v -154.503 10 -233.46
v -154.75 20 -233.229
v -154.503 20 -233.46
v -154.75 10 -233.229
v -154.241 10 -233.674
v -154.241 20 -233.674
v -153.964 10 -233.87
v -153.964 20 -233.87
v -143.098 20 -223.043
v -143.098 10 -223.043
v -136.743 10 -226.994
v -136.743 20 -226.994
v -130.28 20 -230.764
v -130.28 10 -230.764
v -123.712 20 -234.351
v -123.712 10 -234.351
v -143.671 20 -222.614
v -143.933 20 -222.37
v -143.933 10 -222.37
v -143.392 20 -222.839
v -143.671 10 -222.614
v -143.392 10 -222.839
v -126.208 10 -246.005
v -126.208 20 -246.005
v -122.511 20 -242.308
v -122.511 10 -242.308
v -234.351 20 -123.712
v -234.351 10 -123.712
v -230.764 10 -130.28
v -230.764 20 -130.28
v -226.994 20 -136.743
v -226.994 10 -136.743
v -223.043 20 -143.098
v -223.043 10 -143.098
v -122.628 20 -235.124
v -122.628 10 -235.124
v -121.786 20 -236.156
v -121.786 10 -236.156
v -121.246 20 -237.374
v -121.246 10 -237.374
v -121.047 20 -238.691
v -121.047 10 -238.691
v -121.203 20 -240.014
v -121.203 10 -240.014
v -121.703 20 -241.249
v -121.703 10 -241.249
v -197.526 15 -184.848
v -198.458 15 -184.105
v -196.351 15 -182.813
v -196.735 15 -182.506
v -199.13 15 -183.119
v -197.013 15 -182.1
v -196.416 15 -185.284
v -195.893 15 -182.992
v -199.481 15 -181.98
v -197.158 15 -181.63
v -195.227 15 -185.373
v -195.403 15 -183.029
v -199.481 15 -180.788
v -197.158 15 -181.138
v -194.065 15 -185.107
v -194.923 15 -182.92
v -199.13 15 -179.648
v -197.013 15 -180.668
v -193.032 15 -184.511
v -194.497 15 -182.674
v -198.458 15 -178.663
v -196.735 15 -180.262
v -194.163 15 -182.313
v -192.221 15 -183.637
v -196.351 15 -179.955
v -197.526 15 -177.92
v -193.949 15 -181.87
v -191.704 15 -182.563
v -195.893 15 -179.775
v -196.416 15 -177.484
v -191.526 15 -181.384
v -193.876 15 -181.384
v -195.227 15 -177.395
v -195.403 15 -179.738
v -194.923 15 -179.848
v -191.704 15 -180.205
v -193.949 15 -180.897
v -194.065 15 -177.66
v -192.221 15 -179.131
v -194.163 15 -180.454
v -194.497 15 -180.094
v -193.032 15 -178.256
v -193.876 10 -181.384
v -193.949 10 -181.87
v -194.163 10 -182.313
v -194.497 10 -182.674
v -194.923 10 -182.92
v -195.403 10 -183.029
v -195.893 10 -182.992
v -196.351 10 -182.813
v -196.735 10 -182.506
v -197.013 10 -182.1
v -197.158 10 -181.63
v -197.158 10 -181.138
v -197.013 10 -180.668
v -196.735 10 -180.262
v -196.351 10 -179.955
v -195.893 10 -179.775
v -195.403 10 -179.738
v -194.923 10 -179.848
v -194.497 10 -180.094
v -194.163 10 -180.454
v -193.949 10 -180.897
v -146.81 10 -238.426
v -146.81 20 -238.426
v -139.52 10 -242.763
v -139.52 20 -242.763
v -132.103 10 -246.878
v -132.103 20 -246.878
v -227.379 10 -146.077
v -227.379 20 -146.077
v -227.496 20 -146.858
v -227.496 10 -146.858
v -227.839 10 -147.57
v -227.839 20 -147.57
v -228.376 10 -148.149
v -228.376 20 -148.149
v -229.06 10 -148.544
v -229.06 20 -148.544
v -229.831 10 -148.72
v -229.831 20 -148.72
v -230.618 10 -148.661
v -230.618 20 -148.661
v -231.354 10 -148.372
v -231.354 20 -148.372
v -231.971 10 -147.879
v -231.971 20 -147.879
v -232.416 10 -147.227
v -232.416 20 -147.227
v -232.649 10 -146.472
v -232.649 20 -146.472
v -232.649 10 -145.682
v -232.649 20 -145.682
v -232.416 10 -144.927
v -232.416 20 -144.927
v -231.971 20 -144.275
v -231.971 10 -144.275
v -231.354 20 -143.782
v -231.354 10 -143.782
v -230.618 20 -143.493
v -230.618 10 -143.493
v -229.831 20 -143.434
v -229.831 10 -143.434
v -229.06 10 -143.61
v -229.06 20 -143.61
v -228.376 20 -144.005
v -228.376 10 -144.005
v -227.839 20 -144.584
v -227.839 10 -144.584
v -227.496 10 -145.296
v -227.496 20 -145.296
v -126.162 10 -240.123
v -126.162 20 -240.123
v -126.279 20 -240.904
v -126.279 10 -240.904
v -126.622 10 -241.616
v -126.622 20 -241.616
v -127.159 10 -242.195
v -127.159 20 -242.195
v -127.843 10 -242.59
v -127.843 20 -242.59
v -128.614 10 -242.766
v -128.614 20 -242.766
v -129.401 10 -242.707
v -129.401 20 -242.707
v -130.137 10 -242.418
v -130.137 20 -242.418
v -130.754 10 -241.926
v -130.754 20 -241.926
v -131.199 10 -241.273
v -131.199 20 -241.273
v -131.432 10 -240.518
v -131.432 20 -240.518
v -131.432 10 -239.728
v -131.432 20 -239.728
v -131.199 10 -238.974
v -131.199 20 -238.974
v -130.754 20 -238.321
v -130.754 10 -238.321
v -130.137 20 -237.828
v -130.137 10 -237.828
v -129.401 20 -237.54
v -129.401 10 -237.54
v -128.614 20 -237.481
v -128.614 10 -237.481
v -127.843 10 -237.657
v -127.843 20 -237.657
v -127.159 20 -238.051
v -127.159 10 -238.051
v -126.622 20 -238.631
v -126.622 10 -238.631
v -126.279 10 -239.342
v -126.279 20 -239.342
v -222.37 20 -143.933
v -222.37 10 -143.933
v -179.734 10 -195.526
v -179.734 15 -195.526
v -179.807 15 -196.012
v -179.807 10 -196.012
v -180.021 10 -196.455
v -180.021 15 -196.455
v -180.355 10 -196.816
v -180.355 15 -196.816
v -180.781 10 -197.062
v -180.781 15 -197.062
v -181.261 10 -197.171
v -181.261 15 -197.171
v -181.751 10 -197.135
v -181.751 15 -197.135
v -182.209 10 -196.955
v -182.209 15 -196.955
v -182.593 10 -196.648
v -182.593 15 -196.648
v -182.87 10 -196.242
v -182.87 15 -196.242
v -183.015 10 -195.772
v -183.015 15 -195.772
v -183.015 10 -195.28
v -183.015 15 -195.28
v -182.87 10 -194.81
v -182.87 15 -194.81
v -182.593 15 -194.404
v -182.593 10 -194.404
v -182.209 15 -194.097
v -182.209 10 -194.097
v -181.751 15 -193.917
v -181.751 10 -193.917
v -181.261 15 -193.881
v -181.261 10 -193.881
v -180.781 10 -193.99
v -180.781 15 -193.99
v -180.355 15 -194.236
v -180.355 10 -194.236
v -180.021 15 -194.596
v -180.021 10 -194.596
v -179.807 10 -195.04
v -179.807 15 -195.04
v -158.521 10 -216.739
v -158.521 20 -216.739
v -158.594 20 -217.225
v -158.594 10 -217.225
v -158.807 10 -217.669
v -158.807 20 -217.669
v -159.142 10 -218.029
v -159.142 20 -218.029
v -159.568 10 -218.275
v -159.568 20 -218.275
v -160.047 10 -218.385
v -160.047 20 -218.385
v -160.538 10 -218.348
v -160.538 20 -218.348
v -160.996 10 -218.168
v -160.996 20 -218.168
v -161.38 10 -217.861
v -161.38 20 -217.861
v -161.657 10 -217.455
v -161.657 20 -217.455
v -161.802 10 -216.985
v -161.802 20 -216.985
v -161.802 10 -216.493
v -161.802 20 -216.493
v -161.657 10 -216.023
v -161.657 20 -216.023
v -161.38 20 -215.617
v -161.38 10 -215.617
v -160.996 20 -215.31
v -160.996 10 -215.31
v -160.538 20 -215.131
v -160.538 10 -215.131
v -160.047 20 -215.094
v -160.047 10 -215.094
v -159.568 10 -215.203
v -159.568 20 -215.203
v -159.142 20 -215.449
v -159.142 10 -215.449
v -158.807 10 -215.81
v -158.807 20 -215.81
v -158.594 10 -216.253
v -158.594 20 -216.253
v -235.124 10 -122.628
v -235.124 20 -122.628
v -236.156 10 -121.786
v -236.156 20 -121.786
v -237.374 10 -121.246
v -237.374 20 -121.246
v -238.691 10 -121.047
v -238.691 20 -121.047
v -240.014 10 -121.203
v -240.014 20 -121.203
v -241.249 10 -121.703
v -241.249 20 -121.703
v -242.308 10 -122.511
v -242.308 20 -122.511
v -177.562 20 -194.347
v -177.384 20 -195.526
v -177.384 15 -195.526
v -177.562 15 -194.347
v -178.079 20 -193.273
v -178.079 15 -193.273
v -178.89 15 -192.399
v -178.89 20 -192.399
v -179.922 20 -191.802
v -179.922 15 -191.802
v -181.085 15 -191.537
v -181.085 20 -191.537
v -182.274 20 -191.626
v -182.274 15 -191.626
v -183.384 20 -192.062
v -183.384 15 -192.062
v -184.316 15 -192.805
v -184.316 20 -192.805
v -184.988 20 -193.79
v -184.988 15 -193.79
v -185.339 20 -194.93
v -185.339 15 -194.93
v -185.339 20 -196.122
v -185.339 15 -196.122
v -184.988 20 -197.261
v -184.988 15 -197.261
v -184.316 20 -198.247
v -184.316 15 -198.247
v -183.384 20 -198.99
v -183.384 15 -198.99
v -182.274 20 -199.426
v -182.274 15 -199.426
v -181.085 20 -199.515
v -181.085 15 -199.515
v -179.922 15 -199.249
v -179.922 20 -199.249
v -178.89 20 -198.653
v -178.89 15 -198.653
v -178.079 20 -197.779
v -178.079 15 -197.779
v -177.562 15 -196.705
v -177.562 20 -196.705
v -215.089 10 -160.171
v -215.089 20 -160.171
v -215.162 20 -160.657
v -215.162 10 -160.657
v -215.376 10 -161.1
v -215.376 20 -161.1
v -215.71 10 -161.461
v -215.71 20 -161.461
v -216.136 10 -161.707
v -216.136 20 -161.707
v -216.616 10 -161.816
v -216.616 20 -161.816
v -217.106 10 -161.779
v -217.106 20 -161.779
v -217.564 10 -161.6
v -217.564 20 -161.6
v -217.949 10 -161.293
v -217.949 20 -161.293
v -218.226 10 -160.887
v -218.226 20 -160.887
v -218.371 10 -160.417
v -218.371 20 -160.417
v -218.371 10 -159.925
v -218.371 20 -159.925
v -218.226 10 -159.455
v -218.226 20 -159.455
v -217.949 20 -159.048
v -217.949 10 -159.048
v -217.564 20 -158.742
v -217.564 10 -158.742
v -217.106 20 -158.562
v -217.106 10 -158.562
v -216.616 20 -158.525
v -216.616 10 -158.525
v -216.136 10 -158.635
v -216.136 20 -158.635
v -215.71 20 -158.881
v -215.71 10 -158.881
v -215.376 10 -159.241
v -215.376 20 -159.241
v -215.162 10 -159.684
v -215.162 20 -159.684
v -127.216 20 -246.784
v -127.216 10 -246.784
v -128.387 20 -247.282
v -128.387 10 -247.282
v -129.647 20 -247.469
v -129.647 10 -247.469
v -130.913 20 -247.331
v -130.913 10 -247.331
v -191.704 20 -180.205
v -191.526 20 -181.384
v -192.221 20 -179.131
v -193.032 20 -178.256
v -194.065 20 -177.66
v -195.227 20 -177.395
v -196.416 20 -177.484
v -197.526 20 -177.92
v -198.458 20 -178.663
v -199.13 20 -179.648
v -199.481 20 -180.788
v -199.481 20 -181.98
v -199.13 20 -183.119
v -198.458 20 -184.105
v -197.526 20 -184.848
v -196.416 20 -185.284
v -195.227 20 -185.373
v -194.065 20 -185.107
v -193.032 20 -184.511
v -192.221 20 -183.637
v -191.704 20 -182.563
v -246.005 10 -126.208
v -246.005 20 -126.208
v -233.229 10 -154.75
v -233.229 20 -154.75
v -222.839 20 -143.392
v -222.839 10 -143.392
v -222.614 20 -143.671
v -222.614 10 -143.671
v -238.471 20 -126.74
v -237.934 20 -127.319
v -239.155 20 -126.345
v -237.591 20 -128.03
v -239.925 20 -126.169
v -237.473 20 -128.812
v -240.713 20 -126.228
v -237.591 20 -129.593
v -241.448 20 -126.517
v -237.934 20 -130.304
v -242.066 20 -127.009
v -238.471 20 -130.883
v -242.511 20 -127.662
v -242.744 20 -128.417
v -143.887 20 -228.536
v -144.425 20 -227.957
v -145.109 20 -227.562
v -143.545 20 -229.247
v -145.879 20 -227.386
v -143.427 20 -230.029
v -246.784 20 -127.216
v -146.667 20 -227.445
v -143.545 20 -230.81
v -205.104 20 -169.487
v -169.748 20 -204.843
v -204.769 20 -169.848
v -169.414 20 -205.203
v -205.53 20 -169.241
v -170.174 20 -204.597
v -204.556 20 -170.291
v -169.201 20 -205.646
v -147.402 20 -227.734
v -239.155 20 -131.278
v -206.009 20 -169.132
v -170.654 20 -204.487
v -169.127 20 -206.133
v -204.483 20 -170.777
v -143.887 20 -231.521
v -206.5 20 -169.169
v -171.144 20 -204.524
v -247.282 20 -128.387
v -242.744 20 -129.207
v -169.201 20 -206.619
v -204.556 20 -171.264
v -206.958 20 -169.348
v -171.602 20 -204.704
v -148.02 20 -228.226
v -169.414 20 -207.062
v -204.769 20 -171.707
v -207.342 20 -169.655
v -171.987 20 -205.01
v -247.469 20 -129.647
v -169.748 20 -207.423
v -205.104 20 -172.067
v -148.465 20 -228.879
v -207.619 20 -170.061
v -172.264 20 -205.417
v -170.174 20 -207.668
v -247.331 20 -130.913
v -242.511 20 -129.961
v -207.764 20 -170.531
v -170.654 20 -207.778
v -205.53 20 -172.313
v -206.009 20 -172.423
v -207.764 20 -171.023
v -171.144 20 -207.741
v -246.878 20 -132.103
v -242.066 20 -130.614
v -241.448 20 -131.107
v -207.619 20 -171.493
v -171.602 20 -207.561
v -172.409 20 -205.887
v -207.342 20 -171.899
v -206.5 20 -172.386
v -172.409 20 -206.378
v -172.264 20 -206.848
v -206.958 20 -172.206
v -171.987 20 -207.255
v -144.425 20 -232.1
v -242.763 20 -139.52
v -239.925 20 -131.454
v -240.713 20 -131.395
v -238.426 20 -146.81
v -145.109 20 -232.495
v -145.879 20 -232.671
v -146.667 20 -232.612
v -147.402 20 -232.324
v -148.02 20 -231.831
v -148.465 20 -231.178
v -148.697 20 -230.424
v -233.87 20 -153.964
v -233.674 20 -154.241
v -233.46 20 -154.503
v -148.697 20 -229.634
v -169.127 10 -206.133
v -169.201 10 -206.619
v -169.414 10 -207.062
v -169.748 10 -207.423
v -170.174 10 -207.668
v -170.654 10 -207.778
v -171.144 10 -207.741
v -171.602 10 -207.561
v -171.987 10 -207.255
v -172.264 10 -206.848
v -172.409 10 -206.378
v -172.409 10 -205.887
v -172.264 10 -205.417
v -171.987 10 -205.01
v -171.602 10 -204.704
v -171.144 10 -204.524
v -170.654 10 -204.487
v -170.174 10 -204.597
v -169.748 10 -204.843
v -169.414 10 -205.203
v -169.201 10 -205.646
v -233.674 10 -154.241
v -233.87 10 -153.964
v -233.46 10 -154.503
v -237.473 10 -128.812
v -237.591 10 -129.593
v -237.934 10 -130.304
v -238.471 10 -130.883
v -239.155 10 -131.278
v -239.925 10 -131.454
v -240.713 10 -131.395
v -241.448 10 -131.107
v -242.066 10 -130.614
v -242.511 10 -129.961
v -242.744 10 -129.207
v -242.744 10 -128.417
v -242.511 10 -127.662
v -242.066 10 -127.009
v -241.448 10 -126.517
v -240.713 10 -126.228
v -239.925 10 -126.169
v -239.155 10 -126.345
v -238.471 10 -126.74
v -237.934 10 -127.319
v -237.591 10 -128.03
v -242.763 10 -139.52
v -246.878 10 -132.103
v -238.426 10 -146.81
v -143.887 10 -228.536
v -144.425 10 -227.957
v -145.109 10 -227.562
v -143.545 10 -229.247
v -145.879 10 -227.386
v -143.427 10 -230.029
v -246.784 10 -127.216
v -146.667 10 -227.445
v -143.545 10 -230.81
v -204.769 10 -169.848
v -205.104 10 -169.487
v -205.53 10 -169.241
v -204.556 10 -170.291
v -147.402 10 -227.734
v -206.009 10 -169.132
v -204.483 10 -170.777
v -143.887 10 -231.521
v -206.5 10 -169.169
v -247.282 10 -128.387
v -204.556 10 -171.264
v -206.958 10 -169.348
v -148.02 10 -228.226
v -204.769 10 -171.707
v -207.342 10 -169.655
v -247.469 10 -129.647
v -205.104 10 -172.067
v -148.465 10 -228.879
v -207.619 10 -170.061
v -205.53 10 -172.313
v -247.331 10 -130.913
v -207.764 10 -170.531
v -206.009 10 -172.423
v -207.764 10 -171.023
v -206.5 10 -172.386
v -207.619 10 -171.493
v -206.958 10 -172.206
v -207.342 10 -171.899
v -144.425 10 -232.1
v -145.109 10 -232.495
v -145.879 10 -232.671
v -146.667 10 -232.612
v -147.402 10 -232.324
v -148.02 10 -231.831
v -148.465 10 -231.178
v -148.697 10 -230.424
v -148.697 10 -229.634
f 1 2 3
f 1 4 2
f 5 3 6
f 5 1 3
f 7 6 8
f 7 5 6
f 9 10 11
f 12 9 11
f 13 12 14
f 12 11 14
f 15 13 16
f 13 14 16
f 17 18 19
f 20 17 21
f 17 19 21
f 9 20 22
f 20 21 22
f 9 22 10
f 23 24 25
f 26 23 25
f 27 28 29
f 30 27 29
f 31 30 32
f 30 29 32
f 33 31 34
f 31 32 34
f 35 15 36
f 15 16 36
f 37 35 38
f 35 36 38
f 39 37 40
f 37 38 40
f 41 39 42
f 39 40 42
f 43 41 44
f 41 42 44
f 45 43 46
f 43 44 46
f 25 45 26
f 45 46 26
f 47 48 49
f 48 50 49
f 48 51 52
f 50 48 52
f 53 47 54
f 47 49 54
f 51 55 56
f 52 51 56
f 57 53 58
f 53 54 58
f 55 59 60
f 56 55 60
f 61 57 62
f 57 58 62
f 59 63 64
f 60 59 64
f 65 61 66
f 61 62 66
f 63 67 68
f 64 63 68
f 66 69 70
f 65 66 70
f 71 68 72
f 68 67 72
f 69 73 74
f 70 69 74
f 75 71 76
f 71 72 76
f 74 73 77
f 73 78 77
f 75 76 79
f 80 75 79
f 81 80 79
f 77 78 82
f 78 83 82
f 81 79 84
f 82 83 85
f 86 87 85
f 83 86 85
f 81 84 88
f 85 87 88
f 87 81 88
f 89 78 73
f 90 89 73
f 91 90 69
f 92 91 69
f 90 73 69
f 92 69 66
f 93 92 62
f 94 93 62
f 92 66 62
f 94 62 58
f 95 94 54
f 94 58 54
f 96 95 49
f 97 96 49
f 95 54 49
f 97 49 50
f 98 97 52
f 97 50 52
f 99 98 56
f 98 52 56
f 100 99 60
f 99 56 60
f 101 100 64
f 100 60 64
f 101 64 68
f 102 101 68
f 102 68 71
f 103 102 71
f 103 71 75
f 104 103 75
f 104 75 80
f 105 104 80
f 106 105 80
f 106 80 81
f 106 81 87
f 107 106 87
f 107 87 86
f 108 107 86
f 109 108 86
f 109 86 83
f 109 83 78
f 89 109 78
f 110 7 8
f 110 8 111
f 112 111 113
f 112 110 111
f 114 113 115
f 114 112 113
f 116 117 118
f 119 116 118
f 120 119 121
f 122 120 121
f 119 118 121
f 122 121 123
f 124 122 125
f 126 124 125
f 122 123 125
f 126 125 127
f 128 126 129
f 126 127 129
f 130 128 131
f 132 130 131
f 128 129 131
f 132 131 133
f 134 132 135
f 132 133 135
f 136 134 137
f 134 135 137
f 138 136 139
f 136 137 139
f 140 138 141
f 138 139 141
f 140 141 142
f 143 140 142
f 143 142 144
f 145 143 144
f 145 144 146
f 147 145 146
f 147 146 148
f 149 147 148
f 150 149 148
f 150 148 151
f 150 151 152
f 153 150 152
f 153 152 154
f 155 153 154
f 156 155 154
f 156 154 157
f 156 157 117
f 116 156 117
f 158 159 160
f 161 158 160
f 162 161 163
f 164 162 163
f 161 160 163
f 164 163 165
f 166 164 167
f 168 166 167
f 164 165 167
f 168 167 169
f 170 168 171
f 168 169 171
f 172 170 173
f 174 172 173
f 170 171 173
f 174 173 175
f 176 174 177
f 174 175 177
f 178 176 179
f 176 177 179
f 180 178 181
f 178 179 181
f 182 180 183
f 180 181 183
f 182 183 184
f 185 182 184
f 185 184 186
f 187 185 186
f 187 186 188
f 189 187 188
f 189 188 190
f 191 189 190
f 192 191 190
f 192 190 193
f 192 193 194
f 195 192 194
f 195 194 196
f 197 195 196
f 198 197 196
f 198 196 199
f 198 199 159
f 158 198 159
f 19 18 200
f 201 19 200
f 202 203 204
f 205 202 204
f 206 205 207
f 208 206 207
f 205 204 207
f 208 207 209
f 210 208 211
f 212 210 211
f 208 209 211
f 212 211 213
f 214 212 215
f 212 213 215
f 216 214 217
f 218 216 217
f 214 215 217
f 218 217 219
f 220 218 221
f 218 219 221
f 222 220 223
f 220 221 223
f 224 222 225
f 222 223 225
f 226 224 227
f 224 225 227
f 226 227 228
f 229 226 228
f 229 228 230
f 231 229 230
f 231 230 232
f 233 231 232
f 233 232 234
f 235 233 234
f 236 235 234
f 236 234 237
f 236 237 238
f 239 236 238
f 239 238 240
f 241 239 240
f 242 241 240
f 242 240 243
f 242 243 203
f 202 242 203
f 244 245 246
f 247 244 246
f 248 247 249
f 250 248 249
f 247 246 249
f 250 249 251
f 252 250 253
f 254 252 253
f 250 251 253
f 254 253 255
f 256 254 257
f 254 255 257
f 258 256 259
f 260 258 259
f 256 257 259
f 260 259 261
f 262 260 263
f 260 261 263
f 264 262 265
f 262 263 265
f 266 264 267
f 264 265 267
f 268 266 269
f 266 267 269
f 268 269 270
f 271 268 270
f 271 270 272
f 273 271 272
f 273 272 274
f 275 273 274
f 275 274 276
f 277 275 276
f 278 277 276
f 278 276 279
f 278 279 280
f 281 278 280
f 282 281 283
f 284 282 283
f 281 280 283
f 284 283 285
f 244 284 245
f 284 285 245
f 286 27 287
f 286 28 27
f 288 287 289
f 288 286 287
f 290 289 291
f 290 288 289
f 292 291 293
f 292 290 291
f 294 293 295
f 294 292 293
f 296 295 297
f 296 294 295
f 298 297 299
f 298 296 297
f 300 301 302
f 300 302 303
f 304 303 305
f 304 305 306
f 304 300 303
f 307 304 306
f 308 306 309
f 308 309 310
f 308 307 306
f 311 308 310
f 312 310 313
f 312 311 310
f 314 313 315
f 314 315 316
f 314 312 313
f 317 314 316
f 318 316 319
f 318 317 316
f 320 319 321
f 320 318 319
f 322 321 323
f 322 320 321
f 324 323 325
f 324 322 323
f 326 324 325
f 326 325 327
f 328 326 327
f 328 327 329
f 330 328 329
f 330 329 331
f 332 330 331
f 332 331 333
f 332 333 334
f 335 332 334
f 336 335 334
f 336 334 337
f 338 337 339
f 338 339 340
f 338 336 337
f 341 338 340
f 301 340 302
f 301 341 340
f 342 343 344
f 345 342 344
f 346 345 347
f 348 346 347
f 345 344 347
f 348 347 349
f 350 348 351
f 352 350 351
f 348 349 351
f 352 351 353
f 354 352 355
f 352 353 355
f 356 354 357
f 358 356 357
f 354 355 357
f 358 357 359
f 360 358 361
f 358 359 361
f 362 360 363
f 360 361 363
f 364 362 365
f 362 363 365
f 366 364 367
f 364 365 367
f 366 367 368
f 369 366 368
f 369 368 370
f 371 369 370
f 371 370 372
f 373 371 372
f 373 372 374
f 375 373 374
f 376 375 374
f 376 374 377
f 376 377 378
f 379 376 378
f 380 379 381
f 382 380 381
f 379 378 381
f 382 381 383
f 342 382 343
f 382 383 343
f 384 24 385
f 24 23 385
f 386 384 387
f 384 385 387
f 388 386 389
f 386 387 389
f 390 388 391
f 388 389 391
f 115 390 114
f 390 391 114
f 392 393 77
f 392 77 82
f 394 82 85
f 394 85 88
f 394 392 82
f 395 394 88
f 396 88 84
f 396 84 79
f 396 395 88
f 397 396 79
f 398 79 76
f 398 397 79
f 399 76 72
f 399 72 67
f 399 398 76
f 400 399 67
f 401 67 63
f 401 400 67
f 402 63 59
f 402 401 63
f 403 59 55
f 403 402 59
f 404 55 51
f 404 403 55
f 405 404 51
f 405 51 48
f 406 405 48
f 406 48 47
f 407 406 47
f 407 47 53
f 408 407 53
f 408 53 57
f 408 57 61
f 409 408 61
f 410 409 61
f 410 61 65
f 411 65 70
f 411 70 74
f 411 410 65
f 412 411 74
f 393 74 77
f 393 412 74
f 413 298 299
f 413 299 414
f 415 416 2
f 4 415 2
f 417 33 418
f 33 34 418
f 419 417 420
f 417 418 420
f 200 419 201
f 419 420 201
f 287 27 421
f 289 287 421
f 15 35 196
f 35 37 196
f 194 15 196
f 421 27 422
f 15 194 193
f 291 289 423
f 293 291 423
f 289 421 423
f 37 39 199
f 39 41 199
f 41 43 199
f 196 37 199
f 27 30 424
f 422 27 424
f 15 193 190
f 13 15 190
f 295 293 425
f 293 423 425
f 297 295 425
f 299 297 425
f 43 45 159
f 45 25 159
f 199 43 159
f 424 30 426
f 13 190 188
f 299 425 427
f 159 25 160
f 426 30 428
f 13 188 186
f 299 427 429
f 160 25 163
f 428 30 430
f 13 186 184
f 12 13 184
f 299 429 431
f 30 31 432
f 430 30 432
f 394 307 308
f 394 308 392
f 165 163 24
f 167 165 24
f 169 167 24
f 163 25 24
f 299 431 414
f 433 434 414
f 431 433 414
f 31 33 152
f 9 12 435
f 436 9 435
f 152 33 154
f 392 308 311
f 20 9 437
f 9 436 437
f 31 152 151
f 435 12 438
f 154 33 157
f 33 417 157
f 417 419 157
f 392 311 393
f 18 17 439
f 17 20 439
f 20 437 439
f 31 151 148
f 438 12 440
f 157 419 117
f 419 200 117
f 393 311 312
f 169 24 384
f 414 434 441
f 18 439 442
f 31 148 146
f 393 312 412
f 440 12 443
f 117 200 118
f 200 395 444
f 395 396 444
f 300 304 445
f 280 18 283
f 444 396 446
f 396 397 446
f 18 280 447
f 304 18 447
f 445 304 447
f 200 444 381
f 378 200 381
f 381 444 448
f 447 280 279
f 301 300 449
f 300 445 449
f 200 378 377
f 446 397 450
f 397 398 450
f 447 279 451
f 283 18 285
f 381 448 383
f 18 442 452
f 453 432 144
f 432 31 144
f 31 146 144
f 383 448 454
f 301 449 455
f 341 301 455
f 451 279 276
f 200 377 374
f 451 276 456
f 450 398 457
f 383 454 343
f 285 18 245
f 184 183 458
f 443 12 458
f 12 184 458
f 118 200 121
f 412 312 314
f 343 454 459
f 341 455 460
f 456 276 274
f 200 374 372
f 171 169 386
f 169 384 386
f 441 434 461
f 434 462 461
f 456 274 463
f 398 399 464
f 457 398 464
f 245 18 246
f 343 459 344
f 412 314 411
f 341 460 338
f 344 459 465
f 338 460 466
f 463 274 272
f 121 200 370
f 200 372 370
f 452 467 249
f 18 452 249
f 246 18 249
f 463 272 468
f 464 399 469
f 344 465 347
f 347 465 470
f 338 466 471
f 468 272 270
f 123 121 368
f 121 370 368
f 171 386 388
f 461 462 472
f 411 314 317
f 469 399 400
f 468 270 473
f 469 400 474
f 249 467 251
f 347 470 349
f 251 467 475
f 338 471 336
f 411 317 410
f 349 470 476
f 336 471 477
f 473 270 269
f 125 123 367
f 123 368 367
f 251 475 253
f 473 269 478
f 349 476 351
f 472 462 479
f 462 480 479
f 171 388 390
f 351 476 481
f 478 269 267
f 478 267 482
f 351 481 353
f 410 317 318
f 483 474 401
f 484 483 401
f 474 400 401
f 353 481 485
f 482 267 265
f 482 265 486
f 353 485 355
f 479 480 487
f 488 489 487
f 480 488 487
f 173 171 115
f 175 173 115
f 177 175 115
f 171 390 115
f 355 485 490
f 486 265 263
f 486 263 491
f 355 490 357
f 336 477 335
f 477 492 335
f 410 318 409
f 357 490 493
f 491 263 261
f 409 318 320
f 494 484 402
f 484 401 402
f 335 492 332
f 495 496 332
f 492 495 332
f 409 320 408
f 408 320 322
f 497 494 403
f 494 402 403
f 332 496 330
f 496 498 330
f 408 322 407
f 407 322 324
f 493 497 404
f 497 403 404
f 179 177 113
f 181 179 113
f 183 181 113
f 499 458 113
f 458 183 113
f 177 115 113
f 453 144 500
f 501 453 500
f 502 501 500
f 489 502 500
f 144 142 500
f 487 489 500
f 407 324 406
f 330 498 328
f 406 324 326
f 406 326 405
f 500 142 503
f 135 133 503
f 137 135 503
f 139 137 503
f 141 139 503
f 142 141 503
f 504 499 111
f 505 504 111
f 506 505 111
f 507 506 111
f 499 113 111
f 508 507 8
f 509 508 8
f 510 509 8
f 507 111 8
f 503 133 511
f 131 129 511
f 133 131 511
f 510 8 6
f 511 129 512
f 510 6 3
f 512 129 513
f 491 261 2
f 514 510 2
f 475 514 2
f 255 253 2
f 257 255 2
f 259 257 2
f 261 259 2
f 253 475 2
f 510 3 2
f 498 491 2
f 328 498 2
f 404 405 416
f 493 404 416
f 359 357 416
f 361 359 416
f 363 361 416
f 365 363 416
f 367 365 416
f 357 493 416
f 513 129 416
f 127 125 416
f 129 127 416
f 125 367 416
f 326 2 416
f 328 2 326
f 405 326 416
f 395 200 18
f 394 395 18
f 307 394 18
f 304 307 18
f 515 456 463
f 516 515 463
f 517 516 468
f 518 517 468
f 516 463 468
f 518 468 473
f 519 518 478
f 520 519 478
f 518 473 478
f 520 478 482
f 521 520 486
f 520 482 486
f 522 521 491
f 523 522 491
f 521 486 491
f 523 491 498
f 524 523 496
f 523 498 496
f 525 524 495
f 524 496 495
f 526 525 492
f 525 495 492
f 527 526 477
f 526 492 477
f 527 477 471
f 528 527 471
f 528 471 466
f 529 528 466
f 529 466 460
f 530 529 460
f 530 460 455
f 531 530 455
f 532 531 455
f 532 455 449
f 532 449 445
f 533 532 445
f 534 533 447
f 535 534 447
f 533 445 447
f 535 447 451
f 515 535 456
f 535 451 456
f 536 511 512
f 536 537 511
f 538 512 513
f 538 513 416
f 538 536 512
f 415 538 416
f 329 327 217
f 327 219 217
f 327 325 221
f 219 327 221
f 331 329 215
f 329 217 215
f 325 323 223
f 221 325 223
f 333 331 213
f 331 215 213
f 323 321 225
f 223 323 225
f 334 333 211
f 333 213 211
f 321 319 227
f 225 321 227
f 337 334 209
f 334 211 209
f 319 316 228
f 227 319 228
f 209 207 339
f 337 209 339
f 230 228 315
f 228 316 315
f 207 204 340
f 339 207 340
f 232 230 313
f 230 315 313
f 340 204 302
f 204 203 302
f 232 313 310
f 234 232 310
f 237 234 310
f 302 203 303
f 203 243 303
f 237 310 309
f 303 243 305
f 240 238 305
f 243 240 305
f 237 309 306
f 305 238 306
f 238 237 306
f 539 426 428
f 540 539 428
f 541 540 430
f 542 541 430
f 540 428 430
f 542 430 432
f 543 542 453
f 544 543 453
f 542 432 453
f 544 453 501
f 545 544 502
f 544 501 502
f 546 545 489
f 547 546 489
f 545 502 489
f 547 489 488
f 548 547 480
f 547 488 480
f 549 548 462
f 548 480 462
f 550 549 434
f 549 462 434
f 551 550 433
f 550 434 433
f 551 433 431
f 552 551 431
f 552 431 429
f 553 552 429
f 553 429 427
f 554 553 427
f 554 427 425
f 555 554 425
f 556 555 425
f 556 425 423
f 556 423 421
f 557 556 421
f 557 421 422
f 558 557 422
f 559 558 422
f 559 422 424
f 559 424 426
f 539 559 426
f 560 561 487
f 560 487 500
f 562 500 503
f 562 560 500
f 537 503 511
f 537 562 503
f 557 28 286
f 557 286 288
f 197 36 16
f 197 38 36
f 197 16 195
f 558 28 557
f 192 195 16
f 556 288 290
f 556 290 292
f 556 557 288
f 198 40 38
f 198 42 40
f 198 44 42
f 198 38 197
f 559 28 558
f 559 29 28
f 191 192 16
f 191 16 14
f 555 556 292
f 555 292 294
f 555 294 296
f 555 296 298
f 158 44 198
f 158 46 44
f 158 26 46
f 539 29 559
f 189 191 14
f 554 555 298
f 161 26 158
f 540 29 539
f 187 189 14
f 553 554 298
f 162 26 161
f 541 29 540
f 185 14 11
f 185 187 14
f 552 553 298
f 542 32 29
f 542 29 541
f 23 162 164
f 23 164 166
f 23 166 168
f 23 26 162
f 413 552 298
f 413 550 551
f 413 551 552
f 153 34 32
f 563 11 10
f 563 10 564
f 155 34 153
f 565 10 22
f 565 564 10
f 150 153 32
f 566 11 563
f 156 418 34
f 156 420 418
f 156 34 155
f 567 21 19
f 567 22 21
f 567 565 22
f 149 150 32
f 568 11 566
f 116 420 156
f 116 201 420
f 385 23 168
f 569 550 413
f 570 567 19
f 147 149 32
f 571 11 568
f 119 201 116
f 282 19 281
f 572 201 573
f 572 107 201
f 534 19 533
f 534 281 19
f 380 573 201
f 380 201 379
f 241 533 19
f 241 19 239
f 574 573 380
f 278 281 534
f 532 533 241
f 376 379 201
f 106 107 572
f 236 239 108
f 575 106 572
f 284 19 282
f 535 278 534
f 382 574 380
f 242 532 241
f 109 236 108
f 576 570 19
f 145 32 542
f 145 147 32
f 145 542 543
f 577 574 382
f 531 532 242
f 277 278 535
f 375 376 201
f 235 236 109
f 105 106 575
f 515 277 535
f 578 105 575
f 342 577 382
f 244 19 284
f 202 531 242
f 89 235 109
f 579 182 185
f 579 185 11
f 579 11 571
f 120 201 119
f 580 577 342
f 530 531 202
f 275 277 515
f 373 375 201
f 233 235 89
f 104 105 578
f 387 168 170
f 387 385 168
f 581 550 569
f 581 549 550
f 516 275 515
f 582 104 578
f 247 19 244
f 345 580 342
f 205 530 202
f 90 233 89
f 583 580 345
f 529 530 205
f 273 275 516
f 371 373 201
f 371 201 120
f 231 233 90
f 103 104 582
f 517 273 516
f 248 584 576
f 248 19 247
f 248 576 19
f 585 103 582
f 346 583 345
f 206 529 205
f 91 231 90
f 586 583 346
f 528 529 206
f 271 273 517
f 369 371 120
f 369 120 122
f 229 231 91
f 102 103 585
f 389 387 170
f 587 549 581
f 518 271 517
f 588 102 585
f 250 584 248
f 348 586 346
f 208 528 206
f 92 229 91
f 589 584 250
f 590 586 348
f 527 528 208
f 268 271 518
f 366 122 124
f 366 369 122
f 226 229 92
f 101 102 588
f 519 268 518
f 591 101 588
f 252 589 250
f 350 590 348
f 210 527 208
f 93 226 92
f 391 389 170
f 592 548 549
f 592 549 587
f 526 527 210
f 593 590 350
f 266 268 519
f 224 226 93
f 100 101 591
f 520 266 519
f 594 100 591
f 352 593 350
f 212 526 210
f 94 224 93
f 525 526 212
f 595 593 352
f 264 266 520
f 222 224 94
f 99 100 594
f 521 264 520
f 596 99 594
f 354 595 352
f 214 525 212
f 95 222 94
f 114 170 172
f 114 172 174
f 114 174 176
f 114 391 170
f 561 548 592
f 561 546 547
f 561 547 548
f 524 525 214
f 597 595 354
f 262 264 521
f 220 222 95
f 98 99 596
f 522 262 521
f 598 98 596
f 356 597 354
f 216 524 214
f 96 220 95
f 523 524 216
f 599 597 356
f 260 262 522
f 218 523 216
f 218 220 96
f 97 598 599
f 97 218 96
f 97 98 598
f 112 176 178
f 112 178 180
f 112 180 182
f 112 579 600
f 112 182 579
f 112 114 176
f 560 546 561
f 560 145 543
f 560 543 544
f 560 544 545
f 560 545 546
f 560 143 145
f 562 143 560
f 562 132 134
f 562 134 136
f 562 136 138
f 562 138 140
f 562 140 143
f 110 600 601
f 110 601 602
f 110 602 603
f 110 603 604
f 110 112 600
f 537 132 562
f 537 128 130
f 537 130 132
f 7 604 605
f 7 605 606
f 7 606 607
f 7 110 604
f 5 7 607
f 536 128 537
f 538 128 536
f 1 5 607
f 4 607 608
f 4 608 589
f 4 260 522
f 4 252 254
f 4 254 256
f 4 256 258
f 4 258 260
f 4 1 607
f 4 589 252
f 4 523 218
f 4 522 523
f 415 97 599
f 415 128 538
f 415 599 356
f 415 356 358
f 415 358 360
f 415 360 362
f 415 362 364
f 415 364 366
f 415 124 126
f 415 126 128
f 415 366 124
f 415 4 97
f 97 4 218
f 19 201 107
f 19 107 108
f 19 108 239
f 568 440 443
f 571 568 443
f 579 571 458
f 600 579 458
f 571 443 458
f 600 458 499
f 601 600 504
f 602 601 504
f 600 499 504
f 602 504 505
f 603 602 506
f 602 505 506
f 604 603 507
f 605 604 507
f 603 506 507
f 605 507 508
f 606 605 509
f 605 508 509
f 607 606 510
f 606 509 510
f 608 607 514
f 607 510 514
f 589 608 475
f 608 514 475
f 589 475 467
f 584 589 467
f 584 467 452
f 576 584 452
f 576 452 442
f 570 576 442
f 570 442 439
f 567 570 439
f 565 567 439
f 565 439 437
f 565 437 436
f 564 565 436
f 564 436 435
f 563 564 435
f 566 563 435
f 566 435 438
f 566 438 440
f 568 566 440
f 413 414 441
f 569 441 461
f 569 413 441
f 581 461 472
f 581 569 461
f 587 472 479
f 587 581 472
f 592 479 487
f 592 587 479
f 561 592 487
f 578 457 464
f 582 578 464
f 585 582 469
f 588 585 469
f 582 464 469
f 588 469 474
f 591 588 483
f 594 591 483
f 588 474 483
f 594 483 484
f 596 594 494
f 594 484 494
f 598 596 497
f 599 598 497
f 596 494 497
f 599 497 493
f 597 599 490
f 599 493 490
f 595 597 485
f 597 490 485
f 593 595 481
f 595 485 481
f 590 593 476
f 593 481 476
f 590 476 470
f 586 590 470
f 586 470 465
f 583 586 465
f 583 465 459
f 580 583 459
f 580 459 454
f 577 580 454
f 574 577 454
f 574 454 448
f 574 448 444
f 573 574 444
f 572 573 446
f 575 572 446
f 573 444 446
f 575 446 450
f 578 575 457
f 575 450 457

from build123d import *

# Parameters (mm, degrees)
SKETCH_1_R               = 275
SKETCH_1_R_2             = 255
EXTRUDE_1_DEPTH          = 10
EXTRUDE_2_DEPTH          = 10
SKETCH_8_R               = 2.65
SKETCH_8_R_2             = 1.65
SKETCH_8_R_3             = 2.15
CUT_EXTRUDE_1_DEPTH      = 21
SKETCH_9_OUTSIDE_W       = 707.614
SKETCH_9_OUTSIDE_H       = 707.614
CUT_EXTRUDE_2_DEPTH      = 21
SKETCH_10_W              = 777.504065726
SKETCH_10_H              = 20
CUT_EXTRUDE_3_DEPTH      = 276
CUT_EXTRUDE_3_DEPTH_BACK = 276
EXTRUDE_3_DEPTH          = 10
CUT_EXTRUDE_4_DEPTH      = 10
SKETCH_13_R              = 1.65
CUT_EXTRUDE_5_DEPTH      = 10
CUT_EXTRUDE_START        = -10
SKETCH_14_R              = 4
CUT_EXTRUDE_6_DEPTH      = 5
FILLET_1_R               = 5


with BuildPart() as part:
    # 草图1 → 凸台-拉伸1 (new body)
    with BuildSketch(Plane(origin=(0, 0, 0), x_dir=(1, 0, 0), z_dir=(0, 1, 0))):
        Circle(SKETCH_1_R)
        Circle(SKETCH_1_R_2, mode=Mode.SUBTRACT)
    extrude(amount=EXTRUDE_1_DEPTH)

    # 草图10 → 切除-拉伸3 (cut, two sides)
    with BuildSketch(Plane.XY) as cut_extrude_3_sk:
        Rectangle(SKETCH_10_W, SKETCH_10_H)
    extrude(amount=CUT_EXTRUDE_3_DEPTH, mode=Mode.SUBTRACT)
    extrude(cut_extrude_3_sk.sketch, amount=-CUT_EXTRUDE_3_DEPTH_BACK, mode=Mode.SUBTRACT)


with BuildPart() as body_2:
    # 草图2 → 凸台-拉伸2 (new body)
    with BuildSketch(Plane(origin=(0, 10, 0), x_dir=(1, 0, 0), z_dir=(0, 1, 0))):
        with BuildLine():
            Line((-110.525139894, 257.262887824), (-25.423255477, 200))
            Line((-25.423255477, 200), (0, 200))
            Line((0, 200), (25.423255477, 200))
            Line((25.423255477, 200), (110.525139894, 257.262887824))
            ThreePointArc((110.525139894, 257.262887824), (197.989898732, 197.989898732), (257.262887824, 110.525139894))
            Line((257.262887824, 110.525139894), (200, 25.423255477))
            Line((200, 25.423255477), (200, 0))
            Line((200, 0), (200, -25.423255477))
            Line((200, -25.423255477), (257.262887824, -110.525139894))
            ThreePointArc((257.262887824, -110.525139894), (197.989898732, -197.989898732), (110.525139894, -257.262887824))
            Line((110.525139894, -257.262887824), (25.423255477, -200))
            Line((25.423255477, -200), (0, -200))
            Line((0, -200), (-25.423255477, -200))
            Line((-25.423255477, -200), (-110.525139894, -257.262887824))
            ThreePointArc((-110.525139894, -257.262887824), (-197.989898732, -197.989898732), (-257.262887824, -110.525139894))
            Line((-257.262887824, -110.525139894), (-200, -25.423255477))
            Line((-200, -25.423255477), (-200, 25.423255477))
            Line((-200, 25.423255477), (-257.262887824, 110.525139894))
            ThreePointArc((-257.262887824, 110.525139894), (-197.989898732, 197.989898732), (-110.525139894, 257.262887824))
        make_face()
        with BuildLine():
            Line((0, 185), (30, 185))
            Line((30, 185), (111.993839361, 240.171563565))
            ThreePointArc((111.993839361, 240.171563565), (187.383297014, 187.383297014), (240.171563565, 111.993839361))
            Line((240.171563565, 111.993839361), (185, 30))
            Line((185, 30), (185, 0))
            Line((185, 0), (185, -30))
            Line((185, -30), (240.171563565, -111.993839361))
            ThreePointArc((240.171563565, -111.993839361), (187.383297014, -187.383297014), (111.993839361, -240.171563565))
            Line((111.993839361, -240.171563565), (30, -185))
            Line((30, -185), (0, -185))
            Line((0, -185), (-30, -185))
            Line((-30, -185), (-111.993839361, -240.171563565))
            ThreePointArc((-111.993839361, -240.171563565), (-187.383297014, -187.383297014), (-240.171563565, -111.993839361))
            Line((-240.171563565, -111.993839361), (-185, -30))
            Line((-185, -30), (-185, 30))
            Line((-185, 30), (-240.171563565, 111.993839361))
            ThreePointArc((-240.171563565, 111.993839361), (-187.383297014, 187.383297014), (-111.993839361, 240.171563565))
            Line((-111.993839361, 240.171563565), (-30, 185))
            Line((-30, 185), (0, 185))
        make_face(mode=Mode.SUBTRACT)
    extrude(amount=EXTRUDE_2_DEPTH)

    # 草图8 → 切除-拉伸1 (cut, through all)
    with BuildSketch(Plane(origin=(0, 20, 0), x_dir=(1, 0, 0), z_dir=(0, 1, 0))):
        with Locations((-10, 192.5)):
            Circle(SKETCH_8_R)
        with Locations((10, 192.5)):
            Circle(SKETCH_8_R)
        with Locations((-10, -192.5)):
            Circle(SKETCH_8_R)
        with Locations((10, -192.5)):
            Circle(SKETCH_8_R)
        with Locations((192.5, 10)):
            Circle(SKETCH_8_R)
        with Locations((192.5, -10)):
            Circle(SKETCH_8_R)
        with Locations((-192.5, 10)):
            Circle(SKETCH_8_R)
        with Locations((-192.5, -10)):
            Circle(SKETCH_8_R)
        with Locations((-110.525139894, 248.223100485)):
            Circle(SKETCH_8_R_2)
        with Locations((-27.711627738, 192.5)):
            Circle(SKETCH_8_R_3)
        with Locations((-44.304938442, 203.665215623)):
            Circle(SKETCH_8_R_3)
        with Locations((-56.749921469, 212.03912734)):
            Circle(SKETCH_8_R_3)
        with Locations((-69.194904497, 220.413039057)):
            Circle(SKETCH_8_R_3)
        with Locations((-81.639887524, 228.786950774)):
            Circle(SKETCH_8_R_3)
        with Locations((-146.077022117, 230.028561882)):
            Circle(SKETCH_8_R)
        with Locations((-164.415519771, 217.299729706)):
            Circle(SKETCH_8_R)
        with Locations((-183.638937552, 201.316607082)):
            Circle(SKETCH_8_R)
        with Locations((-201.316607082, 183.638937552)):
            Circle(SKETCH_8_R)
        with Locations((-217.299729706, 164.415519771)):
            Circle(SKETCH_8_R)
        with Locations((-230.028561882, 146.077022117)):
            Circle(SKETCH_8_R)
        with Locations((-128.811575358, 240.123330241)):
            Circle(SKETCH_8_R)
        with Locations((-240.123330241, 128.811575358)):
            Circle(SKETCH_8_R)
        with Locations((-228.786950774, 81.639887524)):
            Circle(SKETCH_8_R_3)
        with Locations((-220.413039057, 69.194904497)):
            Circle(SKETCH_8_R_3)
        with Locations((-212.03912734, 56.749921469)):
            Circle(SKETCH_8_R_3)
        with Locations((-203.665215623, 44.304938442)):
            Circle(SKETCH_8_R_3)
        with Locations((-192.5, 27.711627738)):
            Circle(SKETCH_8_R_3)
        with Locations((-248.223100485, 110.525139894)):
            Circle(SKETCH_8_R_2)
        with Locations((192.5, 27.711627738)):
            Circle(SKETCH_8_R_3)
        with Locations((248.223100485, 110.525139894)):
            Circle(SKETCH_8_R_2)
        with Locations((203.665215623, 44.304938442)):
            Circle(SKETCH_8_R_3)
        with Locations((212.03912734, 56.749921469)):
            Circle(SKETCH_8_R_3)
        with Locations((220.413039057, 69.194904497)):
            Circle(SKETCH_8_R_3)
        with Locations((228.786950774, 81.639887524)):
            Circle(SKETCH_8_R_3)
        with Locations((240.123330241, 128.811575358)):
            Circle(SKETCH_8_R)
        with Locations((230.028561882, 146.077022117)):
            Circle(SKETCH_8_R)
        with Locations((128.811575358, 240.123330241)):
            Circle(SKETCH_8_R)
        with Locations((201.316607082, 183.638937552)):
            Circle(SKETCH_8_R)
        with Locations((183.638937552, 201.316607082)):
            Circle(SKETCH_8_R)
        with Locations((164.415519771, 217.299729706)):
            Circle(SKETCH_8_R)
        with Locations((146.077022117, 230.028561882)):
            Circle(SKETCH_8_R)
        with Locations((81.639887524, 228.786950774)):
            Circle(SKETCH_8_R_3)
        with Locations((69.194904497, 220.413039057)):
            Circle(SKETCH_8_R_3)
        with Locations((56.749921469, 212.03912734)):
            Circle(SKETCH_8_R_3)
        with Locations((44.304938442, 203.665215623)):
            Circle(SKETCH_8_R_3)
        with Locations((110.525139894, 248.223100485)):
            Circle(SKETCH_8_R_2)
        with Locations((27.711627738, 192.5)):
            Circle(SKETCH_8_R_3)
        with Locations((217.299729706, 164.415519771)):
            Circle(SKETCH_8_R)
    extrude(amount=-CUT_EXTRUDE_1_DEPTH, mode=Mode.SUBTRACT)

    # 草图9 outside → 切除-拉伸2 (cut, through all)
    with BuildSketch(Plane(origin=(0, 20, 0), x_dir=(1, 0, 0), z_dir=(0, 1, 0))):
        Rectangle(SKETCH_9_OUTSIDE_W, SKETCH_9_OUTSIDE_H)
        with BuildLine():
            Line((-128.813345638, 248.610381894), (-117.653354647, 237.450390904))
            ThreePointArc((-117.653354647, 237.450390904), (-187.383297014, 187.383297014), (-237.450390904, 117.653354647))
            Line((-237.450390904, 117.653354647), (-248.610381894, 128.813345638))
            ThreePointArc((-248.610381894, 128.813345638), (-197.989898732, 197.989898732), (-128.813345638, 248.610381894))
        make_face(mode=Mode.SUBTRACT)
    extrude(amount=-CUT_EXTRUDE_2_DEPTH, mode=Mode.SUBTRACT)

    # 草图11 → 凸台-拉伸3 (add)
    with BuildSketch(Plane(origin=(0, 20, 0), x_dir=(1, 0, 0), z_dir=(0, 1, 0))):
        Polygon((-222.749556316, 143.553596823), (-233.587670194, 154.391710701), (-154.391710701, 233.587670194), (-143.553596823, 222.749556316), align=None)
    extrude(amount=-EXTRUDE_3_DEPTH)

    # 草图12 → 切除-拉伸4 (cut)
    with BuildSketch(Plane(origin=(0, 20, 0), x_dir=(1, 0, 0), z_dir=(0, 1, 0))):
        with BuildLine():
            Line((-233.587670194, 154.391710701), (-154.391710701, 233.587670194))
            ThreePointArc((-154.391710701, 233.587670194), (-197.989898732, 197.989898732), (-233.587670194, 154.391710701))
        make_face()
    extrude(amount=-CUT_EXTRUDE_4_DEPTH, mode=Mode.SUBTRACT)

    # 草图13 → 切除-拉伸5 (cut)
    with BuildSketch(Plane(origin=(0, 20, 0), x_dir=(1, 0, 0), z_dir=(0, 1, 0))):
        with Locations((-195.525945241, 181.383809617)):
            Circle(SKETCH_13_R)
        with Locations((-206.132546958, 170.777207899)):
            Circle(SKETCH_13_R)
        with Locations((-216.739148676, 160.170606181)):
            Circle(SKETCH_13_R)
        with Locations((-181.383809617, 195.525945241)):
            Circle(SKETCH_13_R)
        with Locations((-170.777207899, 206.132546958)):
            Circle(SKETCH_13_R)
        with Locations((-160.170606181, 216.739148676)):
            Circle(SKETCH_13_R)
    extrude(amount=-CUT_EXTRUDE_5_DEPTH, mode=Mode.SUBTRACT)

    # 草图14 → 切除-拉伸6 (cut)
    with BuildSketch(Plane.XZ.offset(-10).offset(CUT_EXTRUDE_START)):
        with Locations((-181.383809617, -195.525945241)):
            Circle(SKETCH_14_R)
        with Locations((-195.525945241, -181.383809617)):
            Circle(SKETCH_14_R)
    extrude(amount=CUT_EXTRUDE_6_DEPTH, mode=Mode.SUBTRACT)

    # 圆角1
    fillet_1_edges = [body_2.edges().sort_by_distance(p)[0] for p in [
        (-237.450390904, 15, -117.653354647),
        (-117.653354647, 15, -237.450390904),
        (-128.813345638, 15, -248.610381894),
        (-248.610381894, 15, -128.813345638),
        (-143.553596823, 15, -222.749556316),
        (-222.749556316, 15, -143.553596823),
        (-154.391710701, 15, -233.587670194),
        (-233.587670194, 15, -154.391710701),
    ]]
    fillet(fillet_1_edges, radius=FILLET_1_R)


solid = body_2.part
